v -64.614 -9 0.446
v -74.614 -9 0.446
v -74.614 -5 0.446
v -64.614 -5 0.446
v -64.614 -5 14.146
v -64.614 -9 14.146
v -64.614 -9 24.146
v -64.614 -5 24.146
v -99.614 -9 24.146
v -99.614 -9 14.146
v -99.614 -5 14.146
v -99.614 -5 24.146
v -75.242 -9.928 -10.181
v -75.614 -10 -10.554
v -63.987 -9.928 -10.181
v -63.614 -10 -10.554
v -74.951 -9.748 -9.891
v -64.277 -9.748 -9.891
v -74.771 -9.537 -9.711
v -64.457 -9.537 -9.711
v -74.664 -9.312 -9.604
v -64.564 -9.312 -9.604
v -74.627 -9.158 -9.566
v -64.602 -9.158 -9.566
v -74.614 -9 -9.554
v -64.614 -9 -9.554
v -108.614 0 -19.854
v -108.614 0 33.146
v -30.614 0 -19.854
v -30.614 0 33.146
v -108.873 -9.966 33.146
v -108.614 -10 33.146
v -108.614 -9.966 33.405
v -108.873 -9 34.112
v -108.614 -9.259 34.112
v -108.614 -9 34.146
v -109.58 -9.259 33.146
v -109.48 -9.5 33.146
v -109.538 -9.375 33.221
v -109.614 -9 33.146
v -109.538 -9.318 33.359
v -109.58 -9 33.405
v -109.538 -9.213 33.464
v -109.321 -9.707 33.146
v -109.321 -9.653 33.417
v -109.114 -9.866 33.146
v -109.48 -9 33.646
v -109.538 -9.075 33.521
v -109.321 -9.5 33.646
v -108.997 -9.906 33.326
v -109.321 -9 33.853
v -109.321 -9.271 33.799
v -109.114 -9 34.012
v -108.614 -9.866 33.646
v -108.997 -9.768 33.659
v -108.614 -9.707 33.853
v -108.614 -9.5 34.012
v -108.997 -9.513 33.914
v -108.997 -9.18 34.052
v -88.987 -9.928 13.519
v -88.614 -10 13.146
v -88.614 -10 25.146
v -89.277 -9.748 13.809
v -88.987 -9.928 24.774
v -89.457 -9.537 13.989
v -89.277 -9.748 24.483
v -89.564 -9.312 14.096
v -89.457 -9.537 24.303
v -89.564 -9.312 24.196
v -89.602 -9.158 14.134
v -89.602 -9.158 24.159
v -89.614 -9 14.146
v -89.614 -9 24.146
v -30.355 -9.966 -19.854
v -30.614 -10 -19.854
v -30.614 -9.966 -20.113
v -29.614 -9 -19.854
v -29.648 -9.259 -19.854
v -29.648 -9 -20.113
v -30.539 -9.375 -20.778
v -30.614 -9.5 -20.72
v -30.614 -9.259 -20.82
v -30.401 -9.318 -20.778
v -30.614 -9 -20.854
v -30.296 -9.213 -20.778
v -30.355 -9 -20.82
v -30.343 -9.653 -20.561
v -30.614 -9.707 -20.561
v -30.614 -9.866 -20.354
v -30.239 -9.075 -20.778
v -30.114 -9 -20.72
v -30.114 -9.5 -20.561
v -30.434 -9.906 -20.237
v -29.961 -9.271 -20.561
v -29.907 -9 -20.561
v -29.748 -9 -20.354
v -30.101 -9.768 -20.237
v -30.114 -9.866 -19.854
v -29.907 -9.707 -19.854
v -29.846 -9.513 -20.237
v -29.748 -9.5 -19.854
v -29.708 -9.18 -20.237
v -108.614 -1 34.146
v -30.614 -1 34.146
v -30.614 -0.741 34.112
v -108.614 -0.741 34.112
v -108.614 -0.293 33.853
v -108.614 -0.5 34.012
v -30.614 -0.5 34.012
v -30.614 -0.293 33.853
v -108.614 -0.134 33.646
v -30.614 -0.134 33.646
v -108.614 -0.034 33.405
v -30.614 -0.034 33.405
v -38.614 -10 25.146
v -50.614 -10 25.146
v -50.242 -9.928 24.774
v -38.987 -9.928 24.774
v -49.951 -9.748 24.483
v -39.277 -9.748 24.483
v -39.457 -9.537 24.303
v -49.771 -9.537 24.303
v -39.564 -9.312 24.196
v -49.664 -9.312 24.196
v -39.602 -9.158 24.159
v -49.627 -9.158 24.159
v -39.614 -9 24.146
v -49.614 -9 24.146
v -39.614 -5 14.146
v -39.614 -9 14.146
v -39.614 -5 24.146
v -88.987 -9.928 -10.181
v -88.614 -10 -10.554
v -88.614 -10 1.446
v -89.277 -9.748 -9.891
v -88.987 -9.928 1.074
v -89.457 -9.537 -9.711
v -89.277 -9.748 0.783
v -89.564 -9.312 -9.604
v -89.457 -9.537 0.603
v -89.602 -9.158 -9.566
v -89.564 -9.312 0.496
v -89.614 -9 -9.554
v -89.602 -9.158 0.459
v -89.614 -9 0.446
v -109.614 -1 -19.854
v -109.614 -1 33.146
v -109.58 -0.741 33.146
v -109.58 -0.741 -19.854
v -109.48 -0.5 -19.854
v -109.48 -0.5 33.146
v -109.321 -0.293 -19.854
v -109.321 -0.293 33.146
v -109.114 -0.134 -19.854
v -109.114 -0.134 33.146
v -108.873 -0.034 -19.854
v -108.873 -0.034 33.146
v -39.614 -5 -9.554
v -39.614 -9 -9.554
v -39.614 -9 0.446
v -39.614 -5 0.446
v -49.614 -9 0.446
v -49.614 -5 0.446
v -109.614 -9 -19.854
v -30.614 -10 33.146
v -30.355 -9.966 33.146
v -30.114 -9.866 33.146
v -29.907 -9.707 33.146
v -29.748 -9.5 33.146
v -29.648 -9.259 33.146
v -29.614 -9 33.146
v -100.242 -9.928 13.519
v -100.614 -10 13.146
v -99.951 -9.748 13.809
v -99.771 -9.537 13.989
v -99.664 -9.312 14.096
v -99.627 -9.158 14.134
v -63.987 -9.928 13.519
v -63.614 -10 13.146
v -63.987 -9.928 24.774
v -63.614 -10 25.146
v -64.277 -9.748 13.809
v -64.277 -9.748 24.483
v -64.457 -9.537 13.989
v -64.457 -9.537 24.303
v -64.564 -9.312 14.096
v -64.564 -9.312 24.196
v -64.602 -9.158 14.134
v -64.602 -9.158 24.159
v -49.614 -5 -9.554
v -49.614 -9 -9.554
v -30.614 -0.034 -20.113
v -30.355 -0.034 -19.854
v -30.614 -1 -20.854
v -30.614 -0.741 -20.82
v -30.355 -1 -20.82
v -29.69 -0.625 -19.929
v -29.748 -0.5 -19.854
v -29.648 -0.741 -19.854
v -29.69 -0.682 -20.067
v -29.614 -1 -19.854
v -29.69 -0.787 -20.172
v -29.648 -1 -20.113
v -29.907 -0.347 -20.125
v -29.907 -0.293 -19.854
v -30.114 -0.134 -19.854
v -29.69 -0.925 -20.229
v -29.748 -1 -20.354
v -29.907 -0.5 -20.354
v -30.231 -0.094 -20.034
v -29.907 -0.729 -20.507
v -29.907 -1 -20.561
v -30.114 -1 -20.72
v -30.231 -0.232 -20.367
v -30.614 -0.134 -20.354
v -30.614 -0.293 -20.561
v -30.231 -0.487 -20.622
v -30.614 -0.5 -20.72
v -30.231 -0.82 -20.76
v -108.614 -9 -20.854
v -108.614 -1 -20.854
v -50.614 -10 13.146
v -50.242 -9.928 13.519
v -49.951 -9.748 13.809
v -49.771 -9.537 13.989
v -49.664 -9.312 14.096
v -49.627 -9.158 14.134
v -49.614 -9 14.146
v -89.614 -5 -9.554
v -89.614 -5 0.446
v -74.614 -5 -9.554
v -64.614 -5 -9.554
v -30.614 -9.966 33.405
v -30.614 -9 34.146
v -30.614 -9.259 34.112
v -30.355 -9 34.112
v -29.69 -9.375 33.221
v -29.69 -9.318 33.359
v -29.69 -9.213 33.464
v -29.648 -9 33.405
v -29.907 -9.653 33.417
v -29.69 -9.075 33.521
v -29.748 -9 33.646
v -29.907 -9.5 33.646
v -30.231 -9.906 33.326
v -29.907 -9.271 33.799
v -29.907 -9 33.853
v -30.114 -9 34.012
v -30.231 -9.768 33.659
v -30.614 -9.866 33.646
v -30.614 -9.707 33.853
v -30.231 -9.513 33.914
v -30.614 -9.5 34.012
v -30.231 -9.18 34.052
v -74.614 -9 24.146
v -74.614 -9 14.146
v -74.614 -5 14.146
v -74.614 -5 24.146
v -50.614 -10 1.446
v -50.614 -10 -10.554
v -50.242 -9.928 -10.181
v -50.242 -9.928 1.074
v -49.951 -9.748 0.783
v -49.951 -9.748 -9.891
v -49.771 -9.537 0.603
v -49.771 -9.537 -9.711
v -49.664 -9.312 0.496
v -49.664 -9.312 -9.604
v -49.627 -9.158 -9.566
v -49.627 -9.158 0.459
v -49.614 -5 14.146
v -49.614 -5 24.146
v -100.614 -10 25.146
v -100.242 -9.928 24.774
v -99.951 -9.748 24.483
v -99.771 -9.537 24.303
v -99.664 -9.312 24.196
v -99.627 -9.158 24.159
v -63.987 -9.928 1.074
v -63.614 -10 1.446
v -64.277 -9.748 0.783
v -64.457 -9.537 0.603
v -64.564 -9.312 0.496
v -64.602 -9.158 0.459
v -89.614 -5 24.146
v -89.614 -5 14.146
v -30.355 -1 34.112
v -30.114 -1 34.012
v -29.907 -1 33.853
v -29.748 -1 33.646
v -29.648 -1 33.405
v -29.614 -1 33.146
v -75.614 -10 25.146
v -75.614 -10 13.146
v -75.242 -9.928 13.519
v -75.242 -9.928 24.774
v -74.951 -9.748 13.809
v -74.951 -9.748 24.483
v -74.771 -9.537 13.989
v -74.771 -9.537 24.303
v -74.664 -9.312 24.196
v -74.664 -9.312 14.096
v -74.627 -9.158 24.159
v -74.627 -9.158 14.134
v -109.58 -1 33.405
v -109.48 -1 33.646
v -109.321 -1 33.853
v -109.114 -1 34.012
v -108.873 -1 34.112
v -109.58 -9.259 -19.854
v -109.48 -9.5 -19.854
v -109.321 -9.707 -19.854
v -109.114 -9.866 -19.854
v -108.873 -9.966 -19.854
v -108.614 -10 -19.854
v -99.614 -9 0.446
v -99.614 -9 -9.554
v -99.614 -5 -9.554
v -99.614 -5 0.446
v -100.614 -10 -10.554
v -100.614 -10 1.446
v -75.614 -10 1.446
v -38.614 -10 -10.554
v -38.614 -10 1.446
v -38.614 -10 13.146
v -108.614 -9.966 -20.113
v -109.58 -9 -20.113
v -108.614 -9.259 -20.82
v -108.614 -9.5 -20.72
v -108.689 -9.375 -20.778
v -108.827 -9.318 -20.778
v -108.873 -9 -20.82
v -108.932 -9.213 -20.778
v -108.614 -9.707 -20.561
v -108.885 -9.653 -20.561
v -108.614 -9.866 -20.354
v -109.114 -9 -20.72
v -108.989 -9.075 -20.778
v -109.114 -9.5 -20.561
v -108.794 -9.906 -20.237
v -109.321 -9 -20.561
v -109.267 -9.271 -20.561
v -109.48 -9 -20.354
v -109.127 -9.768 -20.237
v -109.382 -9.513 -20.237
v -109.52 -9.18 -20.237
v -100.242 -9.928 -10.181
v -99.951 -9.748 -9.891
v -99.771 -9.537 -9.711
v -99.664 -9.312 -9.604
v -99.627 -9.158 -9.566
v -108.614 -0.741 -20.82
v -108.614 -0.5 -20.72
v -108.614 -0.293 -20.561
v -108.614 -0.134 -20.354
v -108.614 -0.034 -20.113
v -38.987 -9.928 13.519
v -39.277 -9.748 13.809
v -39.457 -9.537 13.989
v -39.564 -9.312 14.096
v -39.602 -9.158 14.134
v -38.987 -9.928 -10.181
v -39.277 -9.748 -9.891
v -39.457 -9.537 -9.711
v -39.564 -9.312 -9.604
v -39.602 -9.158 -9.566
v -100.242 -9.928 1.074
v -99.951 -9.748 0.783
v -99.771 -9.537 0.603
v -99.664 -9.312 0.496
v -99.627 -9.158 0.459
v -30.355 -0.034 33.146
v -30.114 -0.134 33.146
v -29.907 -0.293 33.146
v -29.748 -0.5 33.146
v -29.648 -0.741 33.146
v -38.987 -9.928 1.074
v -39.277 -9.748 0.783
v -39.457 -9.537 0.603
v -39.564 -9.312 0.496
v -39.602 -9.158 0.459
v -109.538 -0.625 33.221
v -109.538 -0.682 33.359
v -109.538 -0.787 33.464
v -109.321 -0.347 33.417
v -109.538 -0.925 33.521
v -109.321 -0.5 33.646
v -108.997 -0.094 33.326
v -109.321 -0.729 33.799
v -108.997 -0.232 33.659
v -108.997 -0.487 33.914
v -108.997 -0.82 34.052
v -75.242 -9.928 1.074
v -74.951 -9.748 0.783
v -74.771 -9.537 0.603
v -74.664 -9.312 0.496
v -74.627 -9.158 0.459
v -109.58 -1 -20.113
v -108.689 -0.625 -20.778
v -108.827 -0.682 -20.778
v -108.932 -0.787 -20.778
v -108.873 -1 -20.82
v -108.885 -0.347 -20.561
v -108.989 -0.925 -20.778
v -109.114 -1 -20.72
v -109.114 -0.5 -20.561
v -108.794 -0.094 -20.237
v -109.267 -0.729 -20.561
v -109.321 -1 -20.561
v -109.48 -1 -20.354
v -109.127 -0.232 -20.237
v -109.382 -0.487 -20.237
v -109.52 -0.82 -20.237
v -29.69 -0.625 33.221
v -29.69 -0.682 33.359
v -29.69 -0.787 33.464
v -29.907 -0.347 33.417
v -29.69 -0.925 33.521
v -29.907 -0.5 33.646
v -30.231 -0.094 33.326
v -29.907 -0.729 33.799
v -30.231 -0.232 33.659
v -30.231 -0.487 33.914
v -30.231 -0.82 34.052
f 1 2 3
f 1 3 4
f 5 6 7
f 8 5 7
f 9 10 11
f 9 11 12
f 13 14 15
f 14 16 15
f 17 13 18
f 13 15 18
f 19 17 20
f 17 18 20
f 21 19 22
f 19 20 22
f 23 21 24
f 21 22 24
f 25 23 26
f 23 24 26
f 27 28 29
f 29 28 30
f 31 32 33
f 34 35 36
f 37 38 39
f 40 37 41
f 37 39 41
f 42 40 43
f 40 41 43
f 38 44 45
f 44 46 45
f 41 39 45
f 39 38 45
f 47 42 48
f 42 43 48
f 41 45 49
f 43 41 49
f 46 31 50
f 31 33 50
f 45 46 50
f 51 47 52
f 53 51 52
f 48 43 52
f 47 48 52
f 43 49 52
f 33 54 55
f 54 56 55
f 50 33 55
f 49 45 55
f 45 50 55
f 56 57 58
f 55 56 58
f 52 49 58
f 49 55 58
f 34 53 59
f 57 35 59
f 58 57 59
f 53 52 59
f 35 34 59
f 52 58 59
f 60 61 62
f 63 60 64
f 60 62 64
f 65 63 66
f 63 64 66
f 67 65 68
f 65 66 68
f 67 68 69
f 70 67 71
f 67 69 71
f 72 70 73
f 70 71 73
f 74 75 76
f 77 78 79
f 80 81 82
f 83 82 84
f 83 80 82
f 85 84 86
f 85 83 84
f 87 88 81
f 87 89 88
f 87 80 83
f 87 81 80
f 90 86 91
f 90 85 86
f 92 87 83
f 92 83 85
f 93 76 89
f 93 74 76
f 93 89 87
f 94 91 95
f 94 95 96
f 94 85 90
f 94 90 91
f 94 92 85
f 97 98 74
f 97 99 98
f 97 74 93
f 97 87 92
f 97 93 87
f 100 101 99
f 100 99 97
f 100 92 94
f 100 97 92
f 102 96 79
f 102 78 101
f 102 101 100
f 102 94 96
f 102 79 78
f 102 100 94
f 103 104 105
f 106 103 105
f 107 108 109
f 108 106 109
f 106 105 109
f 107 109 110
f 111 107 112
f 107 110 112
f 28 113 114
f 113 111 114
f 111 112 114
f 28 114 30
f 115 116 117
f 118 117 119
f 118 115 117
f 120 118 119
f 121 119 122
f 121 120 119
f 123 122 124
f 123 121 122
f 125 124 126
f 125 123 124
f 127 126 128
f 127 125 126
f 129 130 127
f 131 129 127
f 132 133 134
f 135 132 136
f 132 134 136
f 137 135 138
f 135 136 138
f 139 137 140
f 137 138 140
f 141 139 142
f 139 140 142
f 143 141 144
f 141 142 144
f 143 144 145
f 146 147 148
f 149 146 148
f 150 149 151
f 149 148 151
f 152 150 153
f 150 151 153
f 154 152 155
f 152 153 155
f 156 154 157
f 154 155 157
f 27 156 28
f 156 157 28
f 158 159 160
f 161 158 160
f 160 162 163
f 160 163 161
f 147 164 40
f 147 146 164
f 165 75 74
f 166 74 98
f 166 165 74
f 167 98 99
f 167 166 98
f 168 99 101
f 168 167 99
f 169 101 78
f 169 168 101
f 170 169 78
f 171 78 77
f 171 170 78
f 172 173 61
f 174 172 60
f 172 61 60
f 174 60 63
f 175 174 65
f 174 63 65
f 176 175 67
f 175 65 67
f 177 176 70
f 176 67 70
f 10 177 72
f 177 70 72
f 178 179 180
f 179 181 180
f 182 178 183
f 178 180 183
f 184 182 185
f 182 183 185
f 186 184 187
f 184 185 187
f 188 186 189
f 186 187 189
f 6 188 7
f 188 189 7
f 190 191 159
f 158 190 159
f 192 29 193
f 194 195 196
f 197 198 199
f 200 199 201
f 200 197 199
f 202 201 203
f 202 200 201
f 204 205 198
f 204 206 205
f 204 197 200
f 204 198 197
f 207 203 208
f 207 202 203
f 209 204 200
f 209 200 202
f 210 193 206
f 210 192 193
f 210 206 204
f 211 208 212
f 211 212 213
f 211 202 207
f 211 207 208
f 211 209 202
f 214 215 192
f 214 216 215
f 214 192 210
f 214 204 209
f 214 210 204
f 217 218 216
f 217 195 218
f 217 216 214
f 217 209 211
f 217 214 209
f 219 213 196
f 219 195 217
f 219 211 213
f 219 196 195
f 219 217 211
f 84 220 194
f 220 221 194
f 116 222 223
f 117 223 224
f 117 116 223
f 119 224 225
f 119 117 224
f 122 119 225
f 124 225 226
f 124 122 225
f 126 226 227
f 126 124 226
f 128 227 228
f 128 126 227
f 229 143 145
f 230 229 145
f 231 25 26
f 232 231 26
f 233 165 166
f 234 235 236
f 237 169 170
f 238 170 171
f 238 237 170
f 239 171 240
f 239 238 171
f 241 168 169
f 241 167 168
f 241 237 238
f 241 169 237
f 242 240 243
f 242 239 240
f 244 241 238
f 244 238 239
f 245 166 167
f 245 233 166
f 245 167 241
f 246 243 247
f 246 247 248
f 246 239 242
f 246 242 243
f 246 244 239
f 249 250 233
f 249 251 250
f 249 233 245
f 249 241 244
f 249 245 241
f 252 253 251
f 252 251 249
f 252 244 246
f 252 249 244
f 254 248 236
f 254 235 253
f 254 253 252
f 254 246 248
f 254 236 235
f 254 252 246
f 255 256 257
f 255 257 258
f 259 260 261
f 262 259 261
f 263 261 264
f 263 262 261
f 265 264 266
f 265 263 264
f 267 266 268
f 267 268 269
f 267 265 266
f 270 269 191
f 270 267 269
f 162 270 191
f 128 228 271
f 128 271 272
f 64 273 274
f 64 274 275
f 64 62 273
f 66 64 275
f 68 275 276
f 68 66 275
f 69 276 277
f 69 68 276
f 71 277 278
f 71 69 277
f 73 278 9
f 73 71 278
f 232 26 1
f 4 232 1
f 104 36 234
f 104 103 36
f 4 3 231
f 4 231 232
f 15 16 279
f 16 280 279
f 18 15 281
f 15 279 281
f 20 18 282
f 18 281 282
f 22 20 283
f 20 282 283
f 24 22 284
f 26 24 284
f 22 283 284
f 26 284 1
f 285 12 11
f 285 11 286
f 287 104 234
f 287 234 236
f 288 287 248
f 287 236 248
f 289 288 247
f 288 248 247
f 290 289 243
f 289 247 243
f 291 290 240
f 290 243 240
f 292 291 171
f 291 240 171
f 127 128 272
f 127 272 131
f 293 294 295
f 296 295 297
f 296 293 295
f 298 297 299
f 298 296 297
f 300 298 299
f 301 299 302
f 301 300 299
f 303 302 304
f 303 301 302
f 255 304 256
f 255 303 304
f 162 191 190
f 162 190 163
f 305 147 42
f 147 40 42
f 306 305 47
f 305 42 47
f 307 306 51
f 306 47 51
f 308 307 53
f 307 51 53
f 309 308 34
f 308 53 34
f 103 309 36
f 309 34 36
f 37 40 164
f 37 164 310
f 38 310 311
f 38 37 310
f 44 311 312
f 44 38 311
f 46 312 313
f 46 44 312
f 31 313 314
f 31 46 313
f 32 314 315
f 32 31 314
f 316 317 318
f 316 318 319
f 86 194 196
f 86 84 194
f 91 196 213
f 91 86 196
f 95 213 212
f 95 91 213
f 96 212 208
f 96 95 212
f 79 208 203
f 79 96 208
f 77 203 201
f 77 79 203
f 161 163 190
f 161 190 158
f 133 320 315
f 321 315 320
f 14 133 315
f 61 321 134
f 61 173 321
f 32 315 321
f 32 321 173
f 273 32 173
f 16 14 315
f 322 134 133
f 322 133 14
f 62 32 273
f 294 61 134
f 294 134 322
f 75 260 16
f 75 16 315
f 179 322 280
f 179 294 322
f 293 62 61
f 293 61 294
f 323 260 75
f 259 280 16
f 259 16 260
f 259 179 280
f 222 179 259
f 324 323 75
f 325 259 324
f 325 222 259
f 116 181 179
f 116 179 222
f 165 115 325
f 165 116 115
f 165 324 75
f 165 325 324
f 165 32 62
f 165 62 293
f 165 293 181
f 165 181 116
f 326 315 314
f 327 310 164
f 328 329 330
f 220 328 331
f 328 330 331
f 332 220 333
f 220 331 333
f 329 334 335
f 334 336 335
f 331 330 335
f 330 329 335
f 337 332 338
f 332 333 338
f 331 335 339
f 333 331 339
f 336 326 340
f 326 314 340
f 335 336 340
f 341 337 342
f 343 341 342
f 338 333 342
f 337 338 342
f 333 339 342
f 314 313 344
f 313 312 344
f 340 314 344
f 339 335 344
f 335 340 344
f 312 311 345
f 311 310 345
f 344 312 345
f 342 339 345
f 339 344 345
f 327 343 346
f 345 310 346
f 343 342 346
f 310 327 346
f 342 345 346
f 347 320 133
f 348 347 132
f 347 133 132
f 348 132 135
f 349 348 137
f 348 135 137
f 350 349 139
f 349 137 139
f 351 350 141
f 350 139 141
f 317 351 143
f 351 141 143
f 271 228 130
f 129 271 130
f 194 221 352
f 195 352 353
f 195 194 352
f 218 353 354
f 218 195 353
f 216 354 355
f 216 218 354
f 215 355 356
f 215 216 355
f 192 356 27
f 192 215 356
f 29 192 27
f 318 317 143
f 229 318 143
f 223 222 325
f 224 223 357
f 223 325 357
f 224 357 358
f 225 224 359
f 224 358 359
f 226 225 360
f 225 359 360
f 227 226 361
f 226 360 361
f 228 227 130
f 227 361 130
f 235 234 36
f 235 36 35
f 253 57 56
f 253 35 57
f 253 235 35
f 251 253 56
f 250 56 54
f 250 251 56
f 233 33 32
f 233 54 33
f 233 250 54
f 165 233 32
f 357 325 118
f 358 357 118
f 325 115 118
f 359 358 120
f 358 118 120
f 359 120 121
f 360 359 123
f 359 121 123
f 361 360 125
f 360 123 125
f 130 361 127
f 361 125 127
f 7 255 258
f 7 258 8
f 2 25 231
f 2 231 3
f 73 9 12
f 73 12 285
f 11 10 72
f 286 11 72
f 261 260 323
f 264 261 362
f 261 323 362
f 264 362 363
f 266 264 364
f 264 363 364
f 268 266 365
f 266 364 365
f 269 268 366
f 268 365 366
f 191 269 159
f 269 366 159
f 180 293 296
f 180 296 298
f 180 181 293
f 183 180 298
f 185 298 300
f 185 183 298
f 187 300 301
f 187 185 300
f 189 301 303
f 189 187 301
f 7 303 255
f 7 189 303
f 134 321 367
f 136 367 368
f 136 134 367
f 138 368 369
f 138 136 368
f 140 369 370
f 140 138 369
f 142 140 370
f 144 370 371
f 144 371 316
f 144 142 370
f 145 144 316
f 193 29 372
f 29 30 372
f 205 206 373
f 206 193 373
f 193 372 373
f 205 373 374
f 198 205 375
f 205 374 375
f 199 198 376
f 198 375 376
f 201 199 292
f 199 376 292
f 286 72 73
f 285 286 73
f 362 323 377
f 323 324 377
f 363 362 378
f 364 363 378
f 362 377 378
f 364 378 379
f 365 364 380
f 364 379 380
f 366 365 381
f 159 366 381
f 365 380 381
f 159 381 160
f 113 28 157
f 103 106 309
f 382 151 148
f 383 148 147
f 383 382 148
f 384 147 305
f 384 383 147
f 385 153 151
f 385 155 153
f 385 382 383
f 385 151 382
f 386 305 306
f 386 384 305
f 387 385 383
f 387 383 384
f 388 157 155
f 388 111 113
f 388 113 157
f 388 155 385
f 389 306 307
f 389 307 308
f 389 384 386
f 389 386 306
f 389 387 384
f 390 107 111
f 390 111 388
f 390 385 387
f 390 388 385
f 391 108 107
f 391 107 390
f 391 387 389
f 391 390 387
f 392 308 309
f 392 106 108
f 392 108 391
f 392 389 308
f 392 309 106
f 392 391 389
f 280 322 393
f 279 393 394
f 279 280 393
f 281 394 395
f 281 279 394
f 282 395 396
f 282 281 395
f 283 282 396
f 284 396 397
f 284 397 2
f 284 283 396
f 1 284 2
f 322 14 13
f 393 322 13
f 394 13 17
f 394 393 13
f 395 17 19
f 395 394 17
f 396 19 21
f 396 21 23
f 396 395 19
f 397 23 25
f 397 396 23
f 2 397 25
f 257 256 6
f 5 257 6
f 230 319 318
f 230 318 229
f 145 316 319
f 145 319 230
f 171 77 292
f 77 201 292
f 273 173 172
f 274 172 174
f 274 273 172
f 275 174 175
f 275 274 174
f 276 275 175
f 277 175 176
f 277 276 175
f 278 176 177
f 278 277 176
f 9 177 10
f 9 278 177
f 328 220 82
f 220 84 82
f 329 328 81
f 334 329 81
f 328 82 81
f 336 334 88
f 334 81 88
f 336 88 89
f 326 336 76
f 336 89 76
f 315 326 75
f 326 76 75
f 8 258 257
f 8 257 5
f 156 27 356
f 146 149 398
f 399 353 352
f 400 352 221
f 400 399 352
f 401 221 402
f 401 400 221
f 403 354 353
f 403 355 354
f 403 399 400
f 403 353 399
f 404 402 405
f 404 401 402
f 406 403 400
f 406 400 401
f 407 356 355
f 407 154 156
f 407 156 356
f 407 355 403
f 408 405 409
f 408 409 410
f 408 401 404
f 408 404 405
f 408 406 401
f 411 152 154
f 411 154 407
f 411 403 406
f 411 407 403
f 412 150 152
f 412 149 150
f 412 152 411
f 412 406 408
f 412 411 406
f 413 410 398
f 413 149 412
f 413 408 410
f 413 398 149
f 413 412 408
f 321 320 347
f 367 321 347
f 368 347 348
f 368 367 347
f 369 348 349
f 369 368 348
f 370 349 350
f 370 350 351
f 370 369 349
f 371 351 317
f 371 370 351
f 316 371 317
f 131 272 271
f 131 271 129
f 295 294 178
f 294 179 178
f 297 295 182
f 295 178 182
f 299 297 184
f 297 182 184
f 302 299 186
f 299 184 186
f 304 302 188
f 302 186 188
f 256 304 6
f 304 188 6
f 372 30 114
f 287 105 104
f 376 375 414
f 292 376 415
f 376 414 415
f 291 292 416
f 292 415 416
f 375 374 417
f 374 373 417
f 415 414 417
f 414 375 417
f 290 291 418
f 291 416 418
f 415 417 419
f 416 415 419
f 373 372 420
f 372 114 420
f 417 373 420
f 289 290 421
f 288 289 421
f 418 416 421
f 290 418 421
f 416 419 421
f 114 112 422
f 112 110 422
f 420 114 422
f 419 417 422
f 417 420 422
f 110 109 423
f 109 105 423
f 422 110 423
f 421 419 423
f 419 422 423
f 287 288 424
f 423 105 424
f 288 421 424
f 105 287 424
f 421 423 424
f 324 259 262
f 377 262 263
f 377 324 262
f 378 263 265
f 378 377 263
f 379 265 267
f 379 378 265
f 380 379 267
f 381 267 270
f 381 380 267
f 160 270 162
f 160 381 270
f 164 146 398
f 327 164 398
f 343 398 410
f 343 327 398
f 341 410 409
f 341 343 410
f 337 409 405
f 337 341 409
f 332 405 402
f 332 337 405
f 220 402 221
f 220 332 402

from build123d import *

# Parameters (mm, degrees)
F0_W     = 80
F0_H     = 55
F1_DEPTH = 10
F2_W     = 10
F2_H     = 10
F3_DEPTH = 5
F4_R     = 1


with BuildPart() as f1:
    # F0 (on Front) → F1 (new body)
    with BuildSketch(Plane.XZ):
        with Locations((-69.614079, 6.646032)):
            Rectangle(F0_W, F0_H)
    extrude(amount=F1_DEPTH)

    # F2 (on face) → F3 (cut)
    with BuildSketch(Plane.XZ.offset(10)):
        with Locations((-94.614079, 19.146032)):
            Rectangle(F2_W, F2_H)
        with Locations((-94.614079, -4.553968)):
            Rectangle(F2_W, F2_H)
        with Locations((-69.614079, 19.146032)):
            Rectangle(F2_W, F2_H)
        with Locations((-69.614079, -4.553968)):
            Rectangle(F2_W, F2_H)
        with Locations((-44.614079, 19.146032)):
            Rectangle(F2_W, F2_H)
        with Locations((-44.614079, -4.553968)):
            Rectangle(F2_W, F2_H)
    extrude(amount=-F3_DEPTH, mode=Mode.SUBTRACT)

    # F4
    f4_edges = [f1.edges().sort_by_distance(p)[0] for p in [
        (-69.614079, -10, 34.146032),
        (-29.614079, -10, 6.646032),
        (-109.614079, -10, 6.646032),
        (-69.614079, -10, -20.853968),
        (-89.614079, -10, -4.553968),
        (-94.614079, -10, 0.446032),
        (-99.614079, -10, -4.553968),
        (-94.614079, -10, -9.553968),
        (-64.614079, -10, -4.553968),
        (-69.614079, -10, 0.446032),
        (-74.614079, -10, -4.553968),
        (-69.614079, -10, -9.553968),
        (-39.614079, -10, -4.553968),
        (-44.614079, -10, 0.446032),
        (-49.614079, -10, -4.553968),
        (-44.614079, -10, -9.553968),
        (-89.614079, -10, 19.146032),
        (-94.614079, -10, 24.146032),
        (-99.614079, -10, 19.146032),
        (-94.614079, -10, 14.146032),
        (-64.614079, -10, 19.146032),
        (-69.614079, -10, 24.146032),
        (-74.614079, -10, 19.146032),
        (-69.614079, -10, 14.146032),
        (-39.614079, -10, 19.146032),
        (-44.614079, -10, 24.146032),
        (-49.614079, -10, 19.146032),
        (-44.614079, -10, 14.146032),
        (-69.614079, 0, 34.146032),
        (-109.614079, 0, 6.646032),
        (-69.614079, 0, -20.853968),
        (-29.614079, 0, 6.646032),
        (-29.614079, -5, 34.146032),
        (-29.614079, -5, -20.853968),
        (-109.614079, -5, 34.146032),
        (-109.614079, -5, -20.853968),
    ]]
    fillet(f4_edges, radius=F4_R)


solid = f1.part
